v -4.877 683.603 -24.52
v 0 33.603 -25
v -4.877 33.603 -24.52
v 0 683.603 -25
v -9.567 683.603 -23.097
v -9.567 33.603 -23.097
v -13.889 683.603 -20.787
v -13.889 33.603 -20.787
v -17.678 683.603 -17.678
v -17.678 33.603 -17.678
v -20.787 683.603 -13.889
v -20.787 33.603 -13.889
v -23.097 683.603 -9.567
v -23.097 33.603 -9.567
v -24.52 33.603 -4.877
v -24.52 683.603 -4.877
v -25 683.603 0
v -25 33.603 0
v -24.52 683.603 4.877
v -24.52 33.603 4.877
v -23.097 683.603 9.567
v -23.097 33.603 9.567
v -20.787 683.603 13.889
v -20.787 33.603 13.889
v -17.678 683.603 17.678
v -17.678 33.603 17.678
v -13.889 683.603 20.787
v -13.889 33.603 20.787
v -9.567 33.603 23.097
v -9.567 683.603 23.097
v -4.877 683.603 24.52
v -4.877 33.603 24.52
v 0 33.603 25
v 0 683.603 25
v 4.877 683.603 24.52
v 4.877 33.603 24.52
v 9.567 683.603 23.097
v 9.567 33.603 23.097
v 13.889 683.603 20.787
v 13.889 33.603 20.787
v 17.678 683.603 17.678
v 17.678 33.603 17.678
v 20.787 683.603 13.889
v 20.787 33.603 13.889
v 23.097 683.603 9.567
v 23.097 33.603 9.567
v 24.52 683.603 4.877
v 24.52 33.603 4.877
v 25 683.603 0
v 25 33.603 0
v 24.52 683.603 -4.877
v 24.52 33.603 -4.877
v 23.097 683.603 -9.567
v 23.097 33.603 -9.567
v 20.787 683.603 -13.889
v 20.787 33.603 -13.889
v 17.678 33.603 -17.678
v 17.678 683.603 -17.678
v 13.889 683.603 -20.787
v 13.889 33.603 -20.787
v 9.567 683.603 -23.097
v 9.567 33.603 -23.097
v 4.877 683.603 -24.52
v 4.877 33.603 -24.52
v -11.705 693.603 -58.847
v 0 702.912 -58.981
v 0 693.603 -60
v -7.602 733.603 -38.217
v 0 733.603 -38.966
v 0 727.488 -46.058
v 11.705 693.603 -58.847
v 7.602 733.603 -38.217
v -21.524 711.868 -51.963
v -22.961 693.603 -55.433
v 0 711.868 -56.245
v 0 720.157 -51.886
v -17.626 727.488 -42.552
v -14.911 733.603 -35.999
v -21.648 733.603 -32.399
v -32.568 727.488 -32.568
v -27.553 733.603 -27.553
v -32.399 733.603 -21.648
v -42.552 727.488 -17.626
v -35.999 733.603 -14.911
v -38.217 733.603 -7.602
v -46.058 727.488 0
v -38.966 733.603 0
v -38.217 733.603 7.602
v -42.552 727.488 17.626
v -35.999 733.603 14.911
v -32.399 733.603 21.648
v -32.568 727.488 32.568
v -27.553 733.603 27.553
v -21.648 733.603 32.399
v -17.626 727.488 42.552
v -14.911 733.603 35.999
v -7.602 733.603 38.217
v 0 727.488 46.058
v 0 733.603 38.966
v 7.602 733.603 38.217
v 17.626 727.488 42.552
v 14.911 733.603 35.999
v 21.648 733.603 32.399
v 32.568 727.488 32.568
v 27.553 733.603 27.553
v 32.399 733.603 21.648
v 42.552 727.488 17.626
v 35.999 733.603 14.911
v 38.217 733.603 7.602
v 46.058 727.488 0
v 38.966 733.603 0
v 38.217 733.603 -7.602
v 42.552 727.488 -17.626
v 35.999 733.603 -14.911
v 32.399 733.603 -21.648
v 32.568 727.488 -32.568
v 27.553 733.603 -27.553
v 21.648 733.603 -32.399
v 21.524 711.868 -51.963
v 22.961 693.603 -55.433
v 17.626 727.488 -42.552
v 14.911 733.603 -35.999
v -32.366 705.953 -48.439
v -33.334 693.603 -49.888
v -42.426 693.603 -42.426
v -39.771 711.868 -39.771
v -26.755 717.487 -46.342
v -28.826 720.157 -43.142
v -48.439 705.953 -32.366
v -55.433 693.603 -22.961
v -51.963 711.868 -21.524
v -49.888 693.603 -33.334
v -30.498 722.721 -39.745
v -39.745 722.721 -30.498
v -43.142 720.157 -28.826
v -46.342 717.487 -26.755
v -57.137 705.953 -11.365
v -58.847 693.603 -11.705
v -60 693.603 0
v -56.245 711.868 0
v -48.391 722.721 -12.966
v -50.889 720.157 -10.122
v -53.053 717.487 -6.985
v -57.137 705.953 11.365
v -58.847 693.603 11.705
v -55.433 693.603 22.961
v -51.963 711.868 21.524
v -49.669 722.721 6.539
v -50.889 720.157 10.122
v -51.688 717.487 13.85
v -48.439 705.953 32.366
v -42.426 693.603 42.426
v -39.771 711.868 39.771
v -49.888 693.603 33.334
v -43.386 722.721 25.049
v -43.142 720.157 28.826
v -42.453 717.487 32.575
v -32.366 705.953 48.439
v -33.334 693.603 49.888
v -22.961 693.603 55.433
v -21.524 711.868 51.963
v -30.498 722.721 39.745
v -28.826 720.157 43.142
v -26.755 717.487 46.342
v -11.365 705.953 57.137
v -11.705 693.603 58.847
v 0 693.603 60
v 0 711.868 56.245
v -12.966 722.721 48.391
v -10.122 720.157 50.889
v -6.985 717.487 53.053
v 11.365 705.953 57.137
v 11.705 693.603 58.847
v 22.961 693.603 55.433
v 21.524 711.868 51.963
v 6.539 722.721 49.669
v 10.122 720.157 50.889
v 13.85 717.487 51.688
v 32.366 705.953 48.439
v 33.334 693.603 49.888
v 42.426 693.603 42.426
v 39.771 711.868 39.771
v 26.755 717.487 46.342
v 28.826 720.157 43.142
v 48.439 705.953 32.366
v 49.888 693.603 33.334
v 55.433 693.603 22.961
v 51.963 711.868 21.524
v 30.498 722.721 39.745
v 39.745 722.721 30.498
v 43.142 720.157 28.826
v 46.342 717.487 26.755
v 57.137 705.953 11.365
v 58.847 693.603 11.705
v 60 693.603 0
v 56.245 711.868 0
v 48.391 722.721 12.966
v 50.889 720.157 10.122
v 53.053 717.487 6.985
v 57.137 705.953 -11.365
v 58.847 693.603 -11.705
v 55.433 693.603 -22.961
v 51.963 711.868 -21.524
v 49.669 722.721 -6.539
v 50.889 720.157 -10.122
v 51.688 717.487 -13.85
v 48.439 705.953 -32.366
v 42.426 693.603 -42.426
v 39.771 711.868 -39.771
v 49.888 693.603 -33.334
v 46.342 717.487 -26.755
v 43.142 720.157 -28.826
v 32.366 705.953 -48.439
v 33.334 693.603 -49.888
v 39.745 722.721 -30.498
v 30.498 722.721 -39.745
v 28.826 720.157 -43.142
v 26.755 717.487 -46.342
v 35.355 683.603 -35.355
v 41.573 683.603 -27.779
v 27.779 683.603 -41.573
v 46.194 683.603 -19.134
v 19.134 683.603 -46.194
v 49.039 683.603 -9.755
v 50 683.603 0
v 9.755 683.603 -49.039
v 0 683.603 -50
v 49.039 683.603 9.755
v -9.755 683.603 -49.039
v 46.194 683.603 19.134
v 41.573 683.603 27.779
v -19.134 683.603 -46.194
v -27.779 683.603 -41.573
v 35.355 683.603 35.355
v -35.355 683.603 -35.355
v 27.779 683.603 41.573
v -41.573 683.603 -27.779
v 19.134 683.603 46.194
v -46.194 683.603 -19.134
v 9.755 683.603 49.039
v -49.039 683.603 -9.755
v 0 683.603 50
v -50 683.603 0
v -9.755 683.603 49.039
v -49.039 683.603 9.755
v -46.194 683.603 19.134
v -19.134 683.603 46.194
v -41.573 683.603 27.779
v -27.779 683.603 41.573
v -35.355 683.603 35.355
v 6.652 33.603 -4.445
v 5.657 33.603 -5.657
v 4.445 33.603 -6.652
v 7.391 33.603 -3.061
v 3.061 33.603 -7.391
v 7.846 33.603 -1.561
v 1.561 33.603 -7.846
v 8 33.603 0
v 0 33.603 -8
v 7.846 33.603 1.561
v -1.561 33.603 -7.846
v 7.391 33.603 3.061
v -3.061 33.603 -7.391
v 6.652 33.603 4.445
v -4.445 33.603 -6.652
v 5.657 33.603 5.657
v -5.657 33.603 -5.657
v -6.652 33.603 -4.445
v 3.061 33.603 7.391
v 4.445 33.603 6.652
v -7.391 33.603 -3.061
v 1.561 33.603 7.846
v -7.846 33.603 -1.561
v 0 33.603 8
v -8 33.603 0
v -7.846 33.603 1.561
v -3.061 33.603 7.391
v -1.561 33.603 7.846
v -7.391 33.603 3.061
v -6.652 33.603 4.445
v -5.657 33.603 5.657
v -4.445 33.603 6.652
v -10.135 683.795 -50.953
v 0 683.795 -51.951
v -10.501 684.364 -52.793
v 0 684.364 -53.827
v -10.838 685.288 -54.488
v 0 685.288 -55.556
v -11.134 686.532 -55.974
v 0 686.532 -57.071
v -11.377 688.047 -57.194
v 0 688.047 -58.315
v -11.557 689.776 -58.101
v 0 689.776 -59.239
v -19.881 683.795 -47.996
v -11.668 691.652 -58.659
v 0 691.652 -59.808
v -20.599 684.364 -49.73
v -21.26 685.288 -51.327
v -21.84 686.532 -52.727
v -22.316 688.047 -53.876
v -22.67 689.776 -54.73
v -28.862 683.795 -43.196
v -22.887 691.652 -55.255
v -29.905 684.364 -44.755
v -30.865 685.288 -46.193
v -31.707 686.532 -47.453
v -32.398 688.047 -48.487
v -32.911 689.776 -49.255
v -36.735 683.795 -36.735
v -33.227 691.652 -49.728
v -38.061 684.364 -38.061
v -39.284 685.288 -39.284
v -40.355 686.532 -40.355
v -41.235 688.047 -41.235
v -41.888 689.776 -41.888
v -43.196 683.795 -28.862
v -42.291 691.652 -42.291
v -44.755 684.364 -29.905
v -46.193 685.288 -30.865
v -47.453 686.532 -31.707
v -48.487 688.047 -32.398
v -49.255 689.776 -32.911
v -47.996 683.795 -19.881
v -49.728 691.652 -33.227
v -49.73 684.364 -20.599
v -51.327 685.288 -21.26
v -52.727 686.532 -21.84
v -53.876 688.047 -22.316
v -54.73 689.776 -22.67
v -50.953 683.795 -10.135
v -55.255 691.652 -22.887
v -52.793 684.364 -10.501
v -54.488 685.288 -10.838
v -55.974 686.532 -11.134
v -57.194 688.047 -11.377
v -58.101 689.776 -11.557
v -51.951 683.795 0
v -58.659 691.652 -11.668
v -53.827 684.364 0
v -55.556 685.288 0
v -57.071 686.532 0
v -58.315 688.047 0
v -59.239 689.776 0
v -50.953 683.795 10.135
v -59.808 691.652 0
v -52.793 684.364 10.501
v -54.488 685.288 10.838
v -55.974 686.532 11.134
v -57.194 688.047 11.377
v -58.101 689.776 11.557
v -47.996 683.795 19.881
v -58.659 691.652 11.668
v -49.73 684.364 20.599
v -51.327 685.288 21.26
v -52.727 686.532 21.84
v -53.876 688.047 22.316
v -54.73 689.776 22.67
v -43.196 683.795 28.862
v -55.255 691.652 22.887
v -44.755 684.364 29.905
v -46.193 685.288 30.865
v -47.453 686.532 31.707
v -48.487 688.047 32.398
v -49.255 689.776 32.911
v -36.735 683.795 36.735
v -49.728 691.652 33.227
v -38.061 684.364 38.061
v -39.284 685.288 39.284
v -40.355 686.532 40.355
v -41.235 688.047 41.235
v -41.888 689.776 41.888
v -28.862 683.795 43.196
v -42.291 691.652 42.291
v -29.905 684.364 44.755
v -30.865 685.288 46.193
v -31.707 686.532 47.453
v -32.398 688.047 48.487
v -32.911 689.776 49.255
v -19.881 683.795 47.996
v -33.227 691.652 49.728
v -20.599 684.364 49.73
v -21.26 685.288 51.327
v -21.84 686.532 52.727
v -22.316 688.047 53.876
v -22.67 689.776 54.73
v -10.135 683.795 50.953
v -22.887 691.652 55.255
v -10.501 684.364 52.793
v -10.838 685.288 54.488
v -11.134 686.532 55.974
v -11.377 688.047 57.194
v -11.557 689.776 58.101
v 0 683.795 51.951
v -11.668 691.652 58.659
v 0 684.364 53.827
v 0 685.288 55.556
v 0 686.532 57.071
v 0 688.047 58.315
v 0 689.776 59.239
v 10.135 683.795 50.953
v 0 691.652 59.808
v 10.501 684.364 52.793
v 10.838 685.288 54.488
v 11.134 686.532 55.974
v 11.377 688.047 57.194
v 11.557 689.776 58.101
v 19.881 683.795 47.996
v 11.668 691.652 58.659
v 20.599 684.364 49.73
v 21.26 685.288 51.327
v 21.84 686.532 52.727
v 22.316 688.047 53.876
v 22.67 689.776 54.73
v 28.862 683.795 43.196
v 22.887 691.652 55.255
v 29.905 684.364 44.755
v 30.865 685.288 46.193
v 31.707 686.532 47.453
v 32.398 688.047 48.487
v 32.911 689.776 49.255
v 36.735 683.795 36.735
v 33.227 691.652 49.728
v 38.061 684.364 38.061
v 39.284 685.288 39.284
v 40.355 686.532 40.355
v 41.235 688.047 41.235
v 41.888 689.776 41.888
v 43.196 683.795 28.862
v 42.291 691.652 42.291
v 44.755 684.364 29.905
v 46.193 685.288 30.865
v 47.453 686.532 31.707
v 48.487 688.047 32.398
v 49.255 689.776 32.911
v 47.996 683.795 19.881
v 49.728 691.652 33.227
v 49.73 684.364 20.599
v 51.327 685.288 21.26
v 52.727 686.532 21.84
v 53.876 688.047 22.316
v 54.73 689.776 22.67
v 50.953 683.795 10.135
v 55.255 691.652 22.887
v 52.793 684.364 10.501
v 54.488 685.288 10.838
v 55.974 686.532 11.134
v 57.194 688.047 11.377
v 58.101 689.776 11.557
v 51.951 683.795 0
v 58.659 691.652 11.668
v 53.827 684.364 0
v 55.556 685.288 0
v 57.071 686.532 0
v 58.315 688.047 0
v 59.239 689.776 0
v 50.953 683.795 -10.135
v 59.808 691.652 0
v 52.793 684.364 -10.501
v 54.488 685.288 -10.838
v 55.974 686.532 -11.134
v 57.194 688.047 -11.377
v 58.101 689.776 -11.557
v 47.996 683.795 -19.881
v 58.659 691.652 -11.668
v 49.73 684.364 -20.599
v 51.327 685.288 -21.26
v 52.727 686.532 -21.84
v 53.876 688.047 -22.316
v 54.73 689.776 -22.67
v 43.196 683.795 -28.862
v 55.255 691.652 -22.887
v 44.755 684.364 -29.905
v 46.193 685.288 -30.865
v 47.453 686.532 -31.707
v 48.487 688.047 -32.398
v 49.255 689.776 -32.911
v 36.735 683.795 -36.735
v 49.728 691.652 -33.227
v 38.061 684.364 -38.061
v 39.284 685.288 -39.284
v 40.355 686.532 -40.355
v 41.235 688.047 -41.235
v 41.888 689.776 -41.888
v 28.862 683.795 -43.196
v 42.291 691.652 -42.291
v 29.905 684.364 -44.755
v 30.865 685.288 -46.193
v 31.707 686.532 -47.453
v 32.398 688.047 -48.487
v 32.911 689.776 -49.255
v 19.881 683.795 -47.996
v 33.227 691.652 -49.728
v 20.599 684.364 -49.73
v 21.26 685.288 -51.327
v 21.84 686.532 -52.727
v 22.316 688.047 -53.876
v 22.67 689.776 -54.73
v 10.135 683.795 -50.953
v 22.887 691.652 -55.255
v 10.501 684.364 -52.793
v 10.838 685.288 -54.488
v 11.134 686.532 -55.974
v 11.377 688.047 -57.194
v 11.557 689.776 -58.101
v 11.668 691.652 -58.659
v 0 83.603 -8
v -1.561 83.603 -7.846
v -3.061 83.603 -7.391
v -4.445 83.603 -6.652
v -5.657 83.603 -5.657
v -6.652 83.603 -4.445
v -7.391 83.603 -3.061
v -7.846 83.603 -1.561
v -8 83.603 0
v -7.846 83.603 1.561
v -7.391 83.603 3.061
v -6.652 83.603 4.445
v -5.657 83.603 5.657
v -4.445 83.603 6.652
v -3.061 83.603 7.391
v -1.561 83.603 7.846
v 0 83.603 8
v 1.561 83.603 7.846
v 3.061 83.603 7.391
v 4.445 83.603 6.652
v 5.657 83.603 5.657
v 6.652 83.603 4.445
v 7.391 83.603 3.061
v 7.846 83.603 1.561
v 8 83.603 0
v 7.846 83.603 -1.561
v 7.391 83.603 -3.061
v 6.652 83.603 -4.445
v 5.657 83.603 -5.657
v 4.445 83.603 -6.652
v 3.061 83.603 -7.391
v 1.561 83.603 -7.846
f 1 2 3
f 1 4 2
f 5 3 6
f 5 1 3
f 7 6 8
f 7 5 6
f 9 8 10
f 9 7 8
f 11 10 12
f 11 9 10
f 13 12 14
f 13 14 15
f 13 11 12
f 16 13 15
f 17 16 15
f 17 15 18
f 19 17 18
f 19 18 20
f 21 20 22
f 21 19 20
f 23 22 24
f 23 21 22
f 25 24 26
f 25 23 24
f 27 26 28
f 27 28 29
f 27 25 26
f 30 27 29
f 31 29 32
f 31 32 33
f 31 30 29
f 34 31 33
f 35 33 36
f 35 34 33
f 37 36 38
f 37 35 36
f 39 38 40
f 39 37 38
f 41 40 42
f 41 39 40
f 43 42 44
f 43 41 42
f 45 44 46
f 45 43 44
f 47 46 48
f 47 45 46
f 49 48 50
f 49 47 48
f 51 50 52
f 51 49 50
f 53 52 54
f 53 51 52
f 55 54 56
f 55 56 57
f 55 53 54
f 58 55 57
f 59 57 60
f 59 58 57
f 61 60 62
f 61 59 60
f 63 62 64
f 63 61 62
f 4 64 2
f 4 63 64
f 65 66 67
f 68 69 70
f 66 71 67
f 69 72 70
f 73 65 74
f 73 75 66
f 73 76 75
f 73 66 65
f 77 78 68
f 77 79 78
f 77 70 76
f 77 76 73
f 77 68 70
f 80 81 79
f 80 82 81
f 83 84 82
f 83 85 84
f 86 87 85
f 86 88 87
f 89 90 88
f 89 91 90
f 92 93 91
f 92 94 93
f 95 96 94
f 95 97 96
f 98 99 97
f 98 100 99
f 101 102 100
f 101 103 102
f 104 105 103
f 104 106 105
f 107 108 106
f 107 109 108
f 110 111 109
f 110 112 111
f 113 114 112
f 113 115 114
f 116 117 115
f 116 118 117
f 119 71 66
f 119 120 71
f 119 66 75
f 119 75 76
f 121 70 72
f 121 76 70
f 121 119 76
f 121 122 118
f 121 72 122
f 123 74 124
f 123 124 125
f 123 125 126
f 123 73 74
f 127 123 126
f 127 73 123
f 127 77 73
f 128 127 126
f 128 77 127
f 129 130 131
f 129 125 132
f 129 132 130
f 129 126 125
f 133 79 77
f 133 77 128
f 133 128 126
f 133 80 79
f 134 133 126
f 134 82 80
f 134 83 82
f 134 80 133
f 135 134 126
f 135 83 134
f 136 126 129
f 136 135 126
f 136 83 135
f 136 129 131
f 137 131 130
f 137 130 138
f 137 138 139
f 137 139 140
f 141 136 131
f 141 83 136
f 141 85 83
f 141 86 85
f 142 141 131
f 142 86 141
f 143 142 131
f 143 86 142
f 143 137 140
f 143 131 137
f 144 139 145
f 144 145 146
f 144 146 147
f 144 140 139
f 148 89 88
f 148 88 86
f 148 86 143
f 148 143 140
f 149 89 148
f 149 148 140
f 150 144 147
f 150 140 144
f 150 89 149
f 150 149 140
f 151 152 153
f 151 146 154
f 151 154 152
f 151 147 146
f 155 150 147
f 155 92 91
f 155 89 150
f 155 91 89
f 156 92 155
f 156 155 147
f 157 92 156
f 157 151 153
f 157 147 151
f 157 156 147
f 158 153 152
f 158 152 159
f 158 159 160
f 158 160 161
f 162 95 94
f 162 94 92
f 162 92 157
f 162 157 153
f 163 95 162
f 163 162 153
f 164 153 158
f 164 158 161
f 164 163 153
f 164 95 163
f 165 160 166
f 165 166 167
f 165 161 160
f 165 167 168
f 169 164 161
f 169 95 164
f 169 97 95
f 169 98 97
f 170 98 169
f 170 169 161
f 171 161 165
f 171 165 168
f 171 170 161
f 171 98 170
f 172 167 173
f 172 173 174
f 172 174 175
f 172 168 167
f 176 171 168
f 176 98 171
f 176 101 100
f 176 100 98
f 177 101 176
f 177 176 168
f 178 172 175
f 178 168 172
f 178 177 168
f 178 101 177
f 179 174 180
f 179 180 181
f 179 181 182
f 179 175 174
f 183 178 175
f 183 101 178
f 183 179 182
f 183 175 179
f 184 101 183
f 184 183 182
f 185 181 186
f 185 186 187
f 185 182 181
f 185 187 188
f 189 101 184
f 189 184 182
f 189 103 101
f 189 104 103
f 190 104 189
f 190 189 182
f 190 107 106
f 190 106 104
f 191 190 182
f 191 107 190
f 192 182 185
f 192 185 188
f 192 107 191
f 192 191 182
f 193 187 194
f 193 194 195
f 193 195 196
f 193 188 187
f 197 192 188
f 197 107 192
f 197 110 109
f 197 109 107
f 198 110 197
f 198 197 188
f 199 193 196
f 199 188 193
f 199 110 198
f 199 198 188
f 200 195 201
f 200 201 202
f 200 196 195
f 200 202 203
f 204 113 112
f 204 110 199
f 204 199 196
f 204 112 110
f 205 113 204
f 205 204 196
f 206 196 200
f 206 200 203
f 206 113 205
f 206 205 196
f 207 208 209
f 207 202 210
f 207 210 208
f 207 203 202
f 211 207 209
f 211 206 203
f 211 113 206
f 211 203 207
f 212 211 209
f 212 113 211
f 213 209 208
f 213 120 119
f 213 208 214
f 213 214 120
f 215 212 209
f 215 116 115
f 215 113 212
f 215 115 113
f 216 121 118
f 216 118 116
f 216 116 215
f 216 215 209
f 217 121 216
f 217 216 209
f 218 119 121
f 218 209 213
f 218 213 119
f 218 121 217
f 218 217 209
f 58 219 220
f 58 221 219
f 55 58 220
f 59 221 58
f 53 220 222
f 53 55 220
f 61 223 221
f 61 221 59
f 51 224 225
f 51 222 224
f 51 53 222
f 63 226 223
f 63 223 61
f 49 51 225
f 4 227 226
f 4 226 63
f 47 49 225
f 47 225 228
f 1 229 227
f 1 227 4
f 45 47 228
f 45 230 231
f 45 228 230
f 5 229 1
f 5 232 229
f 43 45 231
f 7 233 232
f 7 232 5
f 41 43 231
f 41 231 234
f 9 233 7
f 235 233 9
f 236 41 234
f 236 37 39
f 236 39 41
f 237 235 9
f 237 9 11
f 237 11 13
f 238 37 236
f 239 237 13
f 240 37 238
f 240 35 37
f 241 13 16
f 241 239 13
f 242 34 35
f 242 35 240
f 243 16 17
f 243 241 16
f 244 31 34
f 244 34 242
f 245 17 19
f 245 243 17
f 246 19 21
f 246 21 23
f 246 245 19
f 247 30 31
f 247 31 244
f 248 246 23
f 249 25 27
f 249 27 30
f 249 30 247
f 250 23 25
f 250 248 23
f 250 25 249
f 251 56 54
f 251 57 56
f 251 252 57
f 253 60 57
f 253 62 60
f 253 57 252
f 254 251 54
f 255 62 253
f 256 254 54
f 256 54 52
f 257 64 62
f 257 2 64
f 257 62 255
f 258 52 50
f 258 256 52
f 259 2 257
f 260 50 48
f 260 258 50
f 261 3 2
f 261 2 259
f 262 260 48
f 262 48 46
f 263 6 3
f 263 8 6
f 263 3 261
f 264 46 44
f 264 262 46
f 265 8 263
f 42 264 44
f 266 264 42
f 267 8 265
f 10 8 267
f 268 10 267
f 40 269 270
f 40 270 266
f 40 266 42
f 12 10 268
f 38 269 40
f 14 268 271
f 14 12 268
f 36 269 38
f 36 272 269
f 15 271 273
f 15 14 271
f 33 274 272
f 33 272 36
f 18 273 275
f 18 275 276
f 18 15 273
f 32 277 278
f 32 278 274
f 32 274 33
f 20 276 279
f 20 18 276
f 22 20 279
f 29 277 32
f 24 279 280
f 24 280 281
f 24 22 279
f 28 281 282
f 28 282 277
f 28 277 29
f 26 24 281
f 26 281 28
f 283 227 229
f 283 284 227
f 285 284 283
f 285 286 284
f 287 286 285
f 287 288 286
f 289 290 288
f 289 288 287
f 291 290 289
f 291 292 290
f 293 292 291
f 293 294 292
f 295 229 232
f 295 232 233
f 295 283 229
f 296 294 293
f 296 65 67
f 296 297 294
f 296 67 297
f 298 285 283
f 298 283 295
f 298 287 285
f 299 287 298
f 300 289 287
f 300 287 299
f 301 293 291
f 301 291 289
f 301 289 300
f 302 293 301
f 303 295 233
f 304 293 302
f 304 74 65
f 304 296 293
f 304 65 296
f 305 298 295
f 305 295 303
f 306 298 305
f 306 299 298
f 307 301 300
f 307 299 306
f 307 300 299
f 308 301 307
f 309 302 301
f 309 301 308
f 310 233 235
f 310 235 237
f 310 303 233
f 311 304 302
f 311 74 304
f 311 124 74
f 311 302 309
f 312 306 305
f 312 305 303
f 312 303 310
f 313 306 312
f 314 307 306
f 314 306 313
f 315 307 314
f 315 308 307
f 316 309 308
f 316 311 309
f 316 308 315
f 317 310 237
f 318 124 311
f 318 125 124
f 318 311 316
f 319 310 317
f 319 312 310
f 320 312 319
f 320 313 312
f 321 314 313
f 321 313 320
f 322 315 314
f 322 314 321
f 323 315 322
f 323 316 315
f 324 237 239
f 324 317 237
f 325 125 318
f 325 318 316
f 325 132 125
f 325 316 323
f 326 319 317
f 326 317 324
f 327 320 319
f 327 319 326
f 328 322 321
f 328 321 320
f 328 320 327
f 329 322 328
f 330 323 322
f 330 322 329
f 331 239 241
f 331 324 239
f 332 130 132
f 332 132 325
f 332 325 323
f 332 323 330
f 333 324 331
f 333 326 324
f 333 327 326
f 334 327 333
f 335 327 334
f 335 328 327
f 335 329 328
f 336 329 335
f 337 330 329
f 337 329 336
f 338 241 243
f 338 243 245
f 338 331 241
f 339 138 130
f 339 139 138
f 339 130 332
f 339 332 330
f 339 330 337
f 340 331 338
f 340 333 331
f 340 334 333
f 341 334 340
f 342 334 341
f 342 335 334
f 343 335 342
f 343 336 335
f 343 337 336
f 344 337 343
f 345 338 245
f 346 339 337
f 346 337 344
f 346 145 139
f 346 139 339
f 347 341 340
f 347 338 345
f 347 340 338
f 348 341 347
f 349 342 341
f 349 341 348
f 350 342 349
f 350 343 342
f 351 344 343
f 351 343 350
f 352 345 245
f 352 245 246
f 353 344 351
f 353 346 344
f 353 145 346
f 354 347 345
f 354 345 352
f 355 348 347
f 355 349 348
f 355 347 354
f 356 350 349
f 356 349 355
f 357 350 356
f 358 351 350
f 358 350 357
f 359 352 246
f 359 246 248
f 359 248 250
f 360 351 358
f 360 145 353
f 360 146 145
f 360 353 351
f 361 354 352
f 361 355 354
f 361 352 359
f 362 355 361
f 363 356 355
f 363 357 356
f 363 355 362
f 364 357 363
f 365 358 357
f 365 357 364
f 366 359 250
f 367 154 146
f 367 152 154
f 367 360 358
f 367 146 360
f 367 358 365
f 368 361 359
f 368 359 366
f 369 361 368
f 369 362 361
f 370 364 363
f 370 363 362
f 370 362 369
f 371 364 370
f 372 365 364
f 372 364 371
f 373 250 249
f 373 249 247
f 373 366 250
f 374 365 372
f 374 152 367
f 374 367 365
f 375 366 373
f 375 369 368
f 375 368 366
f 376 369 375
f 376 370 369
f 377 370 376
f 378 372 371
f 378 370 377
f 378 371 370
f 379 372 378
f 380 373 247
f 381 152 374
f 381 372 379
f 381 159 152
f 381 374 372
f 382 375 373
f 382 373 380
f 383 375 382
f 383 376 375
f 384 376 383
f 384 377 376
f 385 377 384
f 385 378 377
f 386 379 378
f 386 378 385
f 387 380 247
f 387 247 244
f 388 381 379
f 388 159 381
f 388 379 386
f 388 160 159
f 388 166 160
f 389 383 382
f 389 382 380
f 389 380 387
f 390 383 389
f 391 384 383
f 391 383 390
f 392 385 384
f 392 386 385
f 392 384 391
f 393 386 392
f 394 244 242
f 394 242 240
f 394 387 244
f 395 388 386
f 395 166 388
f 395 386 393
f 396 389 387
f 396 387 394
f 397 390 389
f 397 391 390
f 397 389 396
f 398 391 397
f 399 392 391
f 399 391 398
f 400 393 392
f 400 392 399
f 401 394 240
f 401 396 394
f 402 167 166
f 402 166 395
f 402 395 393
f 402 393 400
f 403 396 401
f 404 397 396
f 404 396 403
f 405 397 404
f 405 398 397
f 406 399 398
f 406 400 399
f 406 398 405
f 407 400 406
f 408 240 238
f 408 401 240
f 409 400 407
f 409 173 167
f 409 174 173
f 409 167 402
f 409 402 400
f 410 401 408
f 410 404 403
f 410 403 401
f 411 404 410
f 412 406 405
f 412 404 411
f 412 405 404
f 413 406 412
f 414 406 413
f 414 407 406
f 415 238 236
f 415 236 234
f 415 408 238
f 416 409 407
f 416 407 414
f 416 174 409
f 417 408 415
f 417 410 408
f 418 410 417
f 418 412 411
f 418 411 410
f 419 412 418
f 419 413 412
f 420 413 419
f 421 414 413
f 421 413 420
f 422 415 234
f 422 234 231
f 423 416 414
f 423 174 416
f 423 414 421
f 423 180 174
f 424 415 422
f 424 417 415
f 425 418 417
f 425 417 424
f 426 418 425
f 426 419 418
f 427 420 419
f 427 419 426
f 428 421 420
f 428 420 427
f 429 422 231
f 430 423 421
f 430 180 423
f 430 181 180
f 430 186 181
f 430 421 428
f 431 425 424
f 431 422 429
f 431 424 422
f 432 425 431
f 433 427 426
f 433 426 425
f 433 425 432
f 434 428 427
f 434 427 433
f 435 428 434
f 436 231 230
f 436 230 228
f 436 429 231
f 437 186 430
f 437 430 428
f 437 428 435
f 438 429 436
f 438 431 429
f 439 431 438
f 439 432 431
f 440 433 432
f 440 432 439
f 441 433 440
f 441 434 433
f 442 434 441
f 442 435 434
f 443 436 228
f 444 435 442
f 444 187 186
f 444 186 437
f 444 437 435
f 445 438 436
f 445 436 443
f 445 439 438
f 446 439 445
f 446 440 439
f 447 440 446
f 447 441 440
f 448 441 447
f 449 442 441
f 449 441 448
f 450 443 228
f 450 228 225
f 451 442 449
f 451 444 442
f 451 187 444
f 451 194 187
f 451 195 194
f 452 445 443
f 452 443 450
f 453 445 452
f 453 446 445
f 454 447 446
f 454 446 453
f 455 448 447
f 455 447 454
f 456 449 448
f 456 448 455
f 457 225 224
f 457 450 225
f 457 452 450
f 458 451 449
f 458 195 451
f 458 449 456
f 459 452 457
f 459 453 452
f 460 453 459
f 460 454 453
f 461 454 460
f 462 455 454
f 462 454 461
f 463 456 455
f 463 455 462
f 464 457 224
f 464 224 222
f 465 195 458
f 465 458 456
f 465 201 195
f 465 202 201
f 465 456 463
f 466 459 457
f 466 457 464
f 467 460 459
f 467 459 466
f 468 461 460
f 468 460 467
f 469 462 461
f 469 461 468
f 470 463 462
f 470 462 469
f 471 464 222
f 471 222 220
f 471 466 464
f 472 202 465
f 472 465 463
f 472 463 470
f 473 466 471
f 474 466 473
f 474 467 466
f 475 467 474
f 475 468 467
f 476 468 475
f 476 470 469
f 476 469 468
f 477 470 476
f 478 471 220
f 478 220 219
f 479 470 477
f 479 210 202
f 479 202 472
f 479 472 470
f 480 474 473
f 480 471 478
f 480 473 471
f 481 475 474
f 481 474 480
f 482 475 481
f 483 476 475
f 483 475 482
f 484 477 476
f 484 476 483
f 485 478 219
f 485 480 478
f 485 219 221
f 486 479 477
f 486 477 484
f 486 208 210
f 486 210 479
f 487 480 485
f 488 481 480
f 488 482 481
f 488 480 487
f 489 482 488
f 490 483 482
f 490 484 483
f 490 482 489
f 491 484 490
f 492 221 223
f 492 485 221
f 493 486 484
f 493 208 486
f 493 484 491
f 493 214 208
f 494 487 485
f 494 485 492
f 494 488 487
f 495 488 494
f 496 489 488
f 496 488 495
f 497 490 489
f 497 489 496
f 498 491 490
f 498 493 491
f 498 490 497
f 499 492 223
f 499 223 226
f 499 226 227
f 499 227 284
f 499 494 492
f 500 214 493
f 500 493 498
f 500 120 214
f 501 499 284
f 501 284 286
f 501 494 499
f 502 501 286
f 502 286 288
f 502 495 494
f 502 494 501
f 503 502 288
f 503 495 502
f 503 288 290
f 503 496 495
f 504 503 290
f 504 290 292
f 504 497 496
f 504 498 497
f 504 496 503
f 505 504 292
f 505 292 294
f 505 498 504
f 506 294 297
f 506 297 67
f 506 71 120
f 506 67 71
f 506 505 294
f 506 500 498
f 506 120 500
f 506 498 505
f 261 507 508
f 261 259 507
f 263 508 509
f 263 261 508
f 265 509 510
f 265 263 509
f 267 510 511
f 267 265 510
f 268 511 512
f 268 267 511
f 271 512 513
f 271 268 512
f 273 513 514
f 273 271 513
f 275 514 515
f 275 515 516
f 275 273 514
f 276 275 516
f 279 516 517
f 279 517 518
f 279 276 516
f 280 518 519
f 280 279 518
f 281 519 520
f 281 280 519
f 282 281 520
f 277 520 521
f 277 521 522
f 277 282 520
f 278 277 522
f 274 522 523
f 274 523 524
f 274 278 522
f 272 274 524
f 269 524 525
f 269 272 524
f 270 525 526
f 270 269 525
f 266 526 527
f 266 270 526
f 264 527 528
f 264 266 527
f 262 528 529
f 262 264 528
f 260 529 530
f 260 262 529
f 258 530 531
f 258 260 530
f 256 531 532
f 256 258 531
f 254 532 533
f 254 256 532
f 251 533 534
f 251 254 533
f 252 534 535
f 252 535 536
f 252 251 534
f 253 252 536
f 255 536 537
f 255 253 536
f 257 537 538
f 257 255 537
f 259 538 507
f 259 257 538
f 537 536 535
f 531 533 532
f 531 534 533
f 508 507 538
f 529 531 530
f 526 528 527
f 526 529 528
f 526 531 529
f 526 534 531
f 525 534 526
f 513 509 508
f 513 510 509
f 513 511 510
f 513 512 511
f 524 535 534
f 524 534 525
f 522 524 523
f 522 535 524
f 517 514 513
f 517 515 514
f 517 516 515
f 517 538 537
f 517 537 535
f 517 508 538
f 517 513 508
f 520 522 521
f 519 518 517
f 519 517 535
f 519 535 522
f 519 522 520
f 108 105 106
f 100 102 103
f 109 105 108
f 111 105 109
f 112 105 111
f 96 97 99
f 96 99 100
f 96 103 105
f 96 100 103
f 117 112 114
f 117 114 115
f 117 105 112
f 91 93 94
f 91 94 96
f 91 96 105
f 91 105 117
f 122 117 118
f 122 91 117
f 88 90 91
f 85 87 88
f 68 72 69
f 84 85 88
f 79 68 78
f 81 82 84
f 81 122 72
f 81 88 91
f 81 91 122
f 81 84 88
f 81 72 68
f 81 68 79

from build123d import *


with BuildPart() as part:
    # Esquisse1 → Révolution1 (revolve)
    with BuildSketch(Plane.XY, mode=Mode.PRIVATE) as r_volution1_sk:
        Polygon((8, 83.602856599), (8, 33.602856599), (25, 33.602856599), (25, 683.602856599), (0, 683.602856599), (0, 83.602856599), align=None)
        with BuildLine():
            Line((0, 693.602856599), (60, 693.602856599))
            ThreePointArc((60, 693.602856599), (54.2599688, 716.114995661), (38.965555337, 733.602856599))
            Line((38.965555337, 733.602856599), (0, 733.602856599))
            Line((0, 733.602856599), (0, 693.602856599))
        make_face()
        with BuildLine():
            Line((25, 683.602856599), (50, 683.602856599))
            ThreePointArc((50, 683.602856599), (57.071067812, 686.531788787), (60, 693.602856599))
            Line((60, 693.602856599), (0, 693.602856599))
            Line((0, 693.602856599), (0, 683.602856599))
            Line((0, 683.602856599), (25, 683.602856599))
        make_face()
    revolve(r_volution1_sk.sketch.rotate(Axis((0, -51.478862279, 0), (0, 1, 0)), 90), axis=Axis((0, -51.478862279, 0), (0, 1, 0)))


solid = part.part
